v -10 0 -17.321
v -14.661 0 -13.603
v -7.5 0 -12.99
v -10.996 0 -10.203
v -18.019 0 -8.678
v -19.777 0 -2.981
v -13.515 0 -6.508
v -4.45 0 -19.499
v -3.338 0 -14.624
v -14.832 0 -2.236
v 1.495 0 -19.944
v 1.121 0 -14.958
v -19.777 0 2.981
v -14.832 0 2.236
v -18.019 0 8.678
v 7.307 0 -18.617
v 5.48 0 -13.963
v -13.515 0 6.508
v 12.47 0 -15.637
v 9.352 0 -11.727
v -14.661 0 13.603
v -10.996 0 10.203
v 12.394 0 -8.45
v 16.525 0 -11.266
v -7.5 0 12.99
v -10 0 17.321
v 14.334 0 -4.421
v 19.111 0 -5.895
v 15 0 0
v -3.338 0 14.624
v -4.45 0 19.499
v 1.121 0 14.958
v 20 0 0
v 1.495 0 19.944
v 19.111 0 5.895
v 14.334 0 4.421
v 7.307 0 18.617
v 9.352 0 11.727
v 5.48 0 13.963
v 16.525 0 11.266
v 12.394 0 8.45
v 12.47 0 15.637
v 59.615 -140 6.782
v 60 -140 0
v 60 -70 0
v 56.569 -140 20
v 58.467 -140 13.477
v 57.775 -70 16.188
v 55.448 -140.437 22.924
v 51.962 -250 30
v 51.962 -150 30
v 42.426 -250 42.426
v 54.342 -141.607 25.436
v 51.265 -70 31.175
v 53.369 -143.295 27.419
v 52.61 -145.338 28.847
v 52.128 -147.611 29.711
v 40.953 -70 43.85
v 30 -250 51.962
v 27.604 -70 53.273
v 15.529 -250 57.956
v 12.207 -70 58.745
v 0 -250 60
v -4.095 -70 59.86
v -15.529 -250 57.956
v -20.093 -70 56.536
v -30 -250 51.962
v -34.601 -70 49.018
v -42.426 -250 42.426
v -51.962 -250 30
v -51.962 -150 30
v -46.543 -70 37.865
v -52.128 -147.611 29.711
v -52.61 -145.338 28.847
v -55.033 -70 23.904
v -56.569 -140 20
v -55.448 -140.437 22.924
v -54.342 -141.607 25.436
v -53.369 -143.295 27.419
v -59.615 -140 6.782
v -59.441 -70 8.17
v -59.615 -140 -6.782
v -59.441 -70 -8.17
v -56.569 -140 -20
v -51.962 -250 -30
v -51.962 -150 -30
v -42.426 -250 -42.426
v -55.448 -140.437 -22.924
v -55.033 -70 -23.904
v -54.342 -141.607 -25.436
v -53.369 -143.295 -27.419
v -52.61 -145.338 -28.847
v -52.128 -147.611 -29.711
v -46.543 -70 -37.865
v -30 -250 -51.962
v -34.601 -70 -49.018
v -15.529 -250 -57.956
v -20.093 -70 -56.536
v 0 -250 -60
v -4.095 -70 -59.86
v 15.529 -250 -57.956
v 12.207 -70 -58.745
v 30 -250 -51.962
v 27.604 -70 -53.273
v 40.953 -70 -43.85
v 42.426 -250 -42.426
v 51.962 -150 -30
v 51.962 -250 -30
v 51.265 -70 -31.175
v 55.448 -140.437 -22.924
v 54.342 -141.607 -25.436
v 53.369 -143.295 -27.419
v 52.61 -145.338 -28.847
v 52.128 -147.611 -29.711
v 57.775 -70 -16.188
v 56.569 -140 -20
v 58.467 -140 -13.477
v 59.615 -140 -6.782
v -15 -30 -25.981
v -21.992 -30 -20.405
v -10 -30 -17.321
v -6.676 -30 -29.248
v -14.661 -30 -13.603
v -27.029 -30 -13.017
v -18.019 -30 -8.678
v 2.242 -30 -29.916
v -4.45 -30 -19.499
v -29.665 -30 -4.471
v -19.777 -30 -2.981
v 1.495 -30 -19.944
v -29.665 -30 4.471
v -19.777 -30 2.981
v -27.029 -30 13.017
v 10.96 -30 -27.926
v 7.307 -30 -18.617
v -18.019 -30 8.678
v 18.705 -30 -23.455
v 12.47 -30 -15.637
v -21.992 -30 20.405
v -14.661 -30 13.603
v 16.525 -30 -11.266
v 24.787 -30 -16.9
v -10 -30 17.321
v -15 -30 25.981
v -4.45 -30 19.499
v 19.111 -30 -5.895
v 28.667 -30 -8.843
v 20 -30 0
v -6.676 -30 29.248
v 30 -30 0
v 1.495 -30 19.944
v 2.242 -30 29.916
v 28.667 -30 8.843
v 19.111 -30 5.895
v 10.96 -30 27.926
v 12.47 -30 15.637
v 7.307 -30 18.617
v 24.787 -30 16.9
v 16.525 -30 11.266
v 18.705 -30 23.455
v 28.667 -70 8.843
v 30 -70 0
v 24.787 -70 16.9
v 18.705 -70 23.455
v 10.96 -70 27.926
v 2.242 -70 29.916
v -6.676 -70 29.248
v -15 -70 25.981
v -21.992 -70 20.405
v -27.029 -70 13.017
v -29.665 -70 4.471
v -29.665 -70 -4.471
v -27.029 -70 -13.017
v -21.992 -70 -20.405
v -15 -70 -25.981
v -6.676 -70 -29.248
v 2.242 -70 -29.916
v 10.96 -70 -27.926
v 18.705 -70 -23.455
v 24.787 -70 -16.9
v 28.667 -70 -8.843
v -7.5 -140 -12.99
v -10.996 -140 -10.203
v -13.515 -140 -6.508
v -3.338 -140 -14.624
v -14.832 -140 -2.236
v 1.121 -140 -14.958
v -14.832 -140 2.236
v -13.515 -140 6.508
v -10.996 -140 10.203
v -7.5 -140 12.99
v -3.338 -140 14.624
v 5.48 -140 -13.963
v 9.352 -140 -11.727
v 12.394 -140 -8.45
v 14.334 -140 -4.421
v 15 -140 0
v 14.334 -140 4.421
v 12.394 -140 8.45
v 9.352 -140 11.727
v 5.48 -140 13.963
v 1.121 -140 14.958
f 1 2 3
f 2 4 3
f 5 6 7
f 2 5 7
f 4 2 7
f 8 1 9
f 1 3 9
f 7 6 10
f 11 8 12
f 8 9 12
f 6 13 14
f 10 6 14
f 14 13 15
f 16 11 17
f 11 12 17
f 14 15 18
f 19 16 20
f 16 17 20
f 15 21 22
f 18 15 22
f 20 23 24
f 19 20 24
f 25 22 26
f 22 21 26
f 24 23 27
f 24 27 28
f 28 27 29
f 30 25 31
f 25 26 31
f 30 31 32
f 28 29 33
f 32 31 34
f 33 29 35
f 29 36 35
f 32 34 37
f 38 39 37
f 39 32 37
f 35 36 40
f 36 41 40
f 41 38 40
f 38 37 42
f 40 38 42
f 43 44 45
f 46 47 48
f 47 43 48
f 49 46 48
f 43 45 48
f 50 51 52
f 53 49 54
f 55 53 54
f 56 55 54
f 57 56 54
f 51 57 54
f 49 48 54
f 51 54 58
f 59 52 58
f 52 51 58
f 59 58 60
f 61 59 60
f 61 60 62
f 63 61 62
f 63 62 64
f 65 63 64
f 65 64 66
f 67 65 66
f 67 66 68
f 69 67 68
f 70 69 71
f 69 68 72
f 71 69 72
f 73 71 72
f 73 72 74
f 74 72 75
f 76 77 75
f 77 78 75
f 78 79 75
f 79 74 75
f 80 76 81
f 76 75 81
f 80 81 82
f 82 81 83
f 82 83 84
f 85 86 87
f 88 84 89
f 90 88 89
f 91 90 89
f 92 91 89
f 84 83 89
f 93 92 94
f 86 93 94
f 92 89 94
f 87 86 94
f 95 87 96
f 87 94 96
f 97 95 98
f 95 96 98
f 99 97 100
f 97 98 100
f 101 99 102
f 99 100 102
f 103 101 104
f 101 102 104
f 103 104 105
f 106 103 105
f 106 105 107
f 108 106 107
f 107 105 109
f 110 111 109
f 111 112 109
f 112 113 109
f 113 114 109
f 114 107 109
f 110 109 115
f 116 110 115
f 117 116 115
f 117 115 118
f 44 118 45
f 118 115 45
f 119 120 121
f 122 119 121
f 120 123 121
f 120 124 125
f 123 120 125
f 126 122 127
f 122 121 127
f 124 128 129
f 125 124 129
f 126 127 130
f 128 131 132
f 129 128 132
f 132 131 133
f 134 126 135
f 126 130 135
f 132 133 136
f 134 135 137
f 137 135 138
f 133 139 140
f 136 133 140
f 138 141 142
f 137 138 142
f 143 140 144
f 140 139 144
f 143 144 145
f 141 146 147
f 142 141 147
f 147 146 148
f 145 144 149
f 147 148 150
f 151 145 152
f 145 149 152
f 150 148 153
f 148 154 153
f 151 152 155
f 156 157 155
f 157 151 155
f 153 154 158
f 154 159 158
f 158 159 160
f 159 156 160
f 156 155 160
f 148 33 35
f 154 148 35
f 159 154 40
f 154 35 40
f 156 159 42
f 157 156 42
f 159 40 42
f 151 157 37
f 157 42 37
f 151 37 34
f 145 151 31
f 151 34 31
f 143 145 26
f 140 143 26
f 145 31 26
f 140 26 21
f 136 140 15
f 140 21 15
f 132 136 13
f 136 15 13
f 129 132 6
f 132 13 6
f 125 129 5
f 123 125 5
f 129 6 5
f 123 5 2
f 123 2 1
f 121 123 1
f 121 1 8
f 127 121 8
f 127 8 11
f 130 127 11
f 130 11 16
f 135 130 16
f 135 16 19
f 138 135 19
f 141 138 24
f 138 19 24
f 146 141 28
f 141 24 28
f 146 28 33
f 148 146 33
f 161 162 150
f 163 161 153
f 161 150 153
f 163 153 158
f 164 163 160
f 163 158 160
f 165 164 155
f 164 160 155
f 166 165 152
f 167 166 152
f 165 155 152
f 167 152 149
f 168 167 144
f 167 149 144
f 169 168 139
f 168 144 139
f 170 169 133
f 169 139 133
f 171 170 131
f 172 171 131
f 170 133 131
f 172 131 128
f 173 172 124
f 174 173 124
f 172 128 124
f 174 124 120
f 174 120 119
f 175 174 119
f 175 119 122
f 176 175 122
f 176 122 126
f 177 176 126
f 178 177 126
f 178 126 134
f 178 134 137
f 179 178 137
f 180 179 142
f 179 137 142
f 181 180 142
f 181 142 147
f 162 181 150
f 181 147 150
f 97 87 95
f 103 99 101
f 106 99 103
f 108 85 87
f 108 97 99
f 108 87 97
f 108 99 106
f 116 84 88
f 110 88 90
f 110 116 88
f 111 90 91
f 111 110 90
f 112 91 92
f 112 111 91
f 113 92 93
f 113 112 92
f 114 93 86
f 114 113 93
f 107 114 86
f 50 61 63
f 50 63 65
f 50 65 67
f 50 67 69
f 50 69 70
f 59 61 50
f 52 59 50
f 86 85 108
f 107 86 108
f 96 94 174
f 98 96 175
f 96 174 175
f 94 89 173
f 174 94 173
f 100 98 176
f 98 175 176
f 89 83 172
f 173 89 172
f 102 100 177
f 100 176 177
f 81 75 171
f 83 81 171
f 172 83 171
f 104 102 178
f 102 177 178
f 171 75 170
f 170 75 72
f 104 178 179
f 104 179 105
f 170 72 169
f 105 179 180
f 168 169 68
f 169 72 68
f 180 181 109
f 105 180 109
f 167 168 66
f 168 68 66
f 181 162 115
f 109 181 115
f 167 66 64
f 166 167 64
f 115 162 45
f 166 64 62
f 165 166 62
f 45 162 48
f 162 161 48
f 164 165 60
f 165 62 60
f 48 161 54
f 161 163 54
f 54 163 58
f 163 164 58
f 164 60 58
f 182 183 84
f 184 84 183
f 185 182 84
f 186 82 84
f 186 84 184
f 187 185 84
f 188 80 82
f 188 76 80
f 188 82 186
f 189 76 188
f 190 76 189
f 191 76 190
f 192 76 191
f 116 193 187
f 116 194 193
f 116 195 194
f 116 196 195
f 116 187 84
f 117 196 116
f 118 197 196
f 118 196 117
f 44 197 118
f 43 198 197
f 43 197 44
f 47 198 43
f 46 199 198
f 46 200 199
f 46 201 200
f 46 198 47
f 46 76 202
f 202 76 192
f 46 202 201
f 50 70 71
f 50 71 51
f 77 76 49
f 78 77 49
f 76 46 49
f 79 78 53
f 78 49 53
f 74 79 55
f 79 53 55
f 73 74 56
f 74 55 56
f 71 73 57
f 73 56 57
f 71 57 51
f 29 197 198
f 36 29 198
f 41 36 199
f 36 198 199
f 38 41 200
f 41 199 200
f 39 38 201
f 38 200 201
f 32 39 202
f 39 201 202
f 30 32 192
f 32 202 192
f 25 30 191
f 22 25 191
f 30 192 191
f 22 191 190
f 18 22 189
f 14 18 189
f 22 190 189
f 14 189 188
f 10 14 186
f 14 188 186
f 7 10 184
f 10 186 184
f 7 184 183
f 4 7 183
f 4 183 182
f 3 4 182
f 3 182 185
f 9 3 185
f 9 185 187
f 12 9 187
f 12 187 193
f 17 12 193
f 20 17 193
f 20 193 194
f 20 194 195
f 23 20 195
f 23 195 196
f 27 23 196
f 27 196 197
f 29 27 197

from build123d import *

# Parameters (mm, degrees)
F0_R     = 20
F1_DEPTH = 30
F2_R     = 30
F3_DEPTH = 40
F4_R     = 60
F5_DEPTH = 180
F6_R     = 15
F7_DEPTH = 250
F8_W     = 141.35922
F8_H     = 60
F9_DEPTH = 110
F10_R    = 10
F11_R    = 10


with BuildPart() as f1:
    # F0 (on Front) → F1 (new body)
    with BuildSketch(Plane.XZ):
        Circle(F0_R)
    extrude(amount=F1_DEPTH)

    # F2 (on face) → F3 (join)
    with BuildSketch(Plane.XZ.offset(30)):
        Circle(F2_R)
    extrude(amount=F3_DEPTH)

    # F4 (on face) → F5 (join)
    with BuildSketch(Plane.XZ.offset(70)):
        Circle(F4_R)
    extrude(amount=F5_DEPTH)

    # F6 (on face) → F7 (cut)
    with BuildSketch(Plane.XZ.offset(250)):
        Circle(F6_R)
    extrude(amount=-F7_DEPTH, mode=Mode.SUBTRACT)

    # F8 (on face) → F9 (cut)
    with BuildSketch(Plane.XZ.offset(250)):
        Rectangle(F8_W, F8_H)
    extrude(amount=-F9_DEPTH, mode=Mode.SUBTRACT)

    # F10
    f10_edges = [f1.edges().sort_by_distance(p)[0] for p in [
        (0, -140, 30),
    ]]
    fillet(f10_edges, radius=F10_R)

    # F11
    f11_edges = [f1.edges().sort_by_distance(p)[0] for p in [
        (0, -140, -30),
    ]]
    fillet(f11_edges, radius=F11_R)


solid = f1.part
